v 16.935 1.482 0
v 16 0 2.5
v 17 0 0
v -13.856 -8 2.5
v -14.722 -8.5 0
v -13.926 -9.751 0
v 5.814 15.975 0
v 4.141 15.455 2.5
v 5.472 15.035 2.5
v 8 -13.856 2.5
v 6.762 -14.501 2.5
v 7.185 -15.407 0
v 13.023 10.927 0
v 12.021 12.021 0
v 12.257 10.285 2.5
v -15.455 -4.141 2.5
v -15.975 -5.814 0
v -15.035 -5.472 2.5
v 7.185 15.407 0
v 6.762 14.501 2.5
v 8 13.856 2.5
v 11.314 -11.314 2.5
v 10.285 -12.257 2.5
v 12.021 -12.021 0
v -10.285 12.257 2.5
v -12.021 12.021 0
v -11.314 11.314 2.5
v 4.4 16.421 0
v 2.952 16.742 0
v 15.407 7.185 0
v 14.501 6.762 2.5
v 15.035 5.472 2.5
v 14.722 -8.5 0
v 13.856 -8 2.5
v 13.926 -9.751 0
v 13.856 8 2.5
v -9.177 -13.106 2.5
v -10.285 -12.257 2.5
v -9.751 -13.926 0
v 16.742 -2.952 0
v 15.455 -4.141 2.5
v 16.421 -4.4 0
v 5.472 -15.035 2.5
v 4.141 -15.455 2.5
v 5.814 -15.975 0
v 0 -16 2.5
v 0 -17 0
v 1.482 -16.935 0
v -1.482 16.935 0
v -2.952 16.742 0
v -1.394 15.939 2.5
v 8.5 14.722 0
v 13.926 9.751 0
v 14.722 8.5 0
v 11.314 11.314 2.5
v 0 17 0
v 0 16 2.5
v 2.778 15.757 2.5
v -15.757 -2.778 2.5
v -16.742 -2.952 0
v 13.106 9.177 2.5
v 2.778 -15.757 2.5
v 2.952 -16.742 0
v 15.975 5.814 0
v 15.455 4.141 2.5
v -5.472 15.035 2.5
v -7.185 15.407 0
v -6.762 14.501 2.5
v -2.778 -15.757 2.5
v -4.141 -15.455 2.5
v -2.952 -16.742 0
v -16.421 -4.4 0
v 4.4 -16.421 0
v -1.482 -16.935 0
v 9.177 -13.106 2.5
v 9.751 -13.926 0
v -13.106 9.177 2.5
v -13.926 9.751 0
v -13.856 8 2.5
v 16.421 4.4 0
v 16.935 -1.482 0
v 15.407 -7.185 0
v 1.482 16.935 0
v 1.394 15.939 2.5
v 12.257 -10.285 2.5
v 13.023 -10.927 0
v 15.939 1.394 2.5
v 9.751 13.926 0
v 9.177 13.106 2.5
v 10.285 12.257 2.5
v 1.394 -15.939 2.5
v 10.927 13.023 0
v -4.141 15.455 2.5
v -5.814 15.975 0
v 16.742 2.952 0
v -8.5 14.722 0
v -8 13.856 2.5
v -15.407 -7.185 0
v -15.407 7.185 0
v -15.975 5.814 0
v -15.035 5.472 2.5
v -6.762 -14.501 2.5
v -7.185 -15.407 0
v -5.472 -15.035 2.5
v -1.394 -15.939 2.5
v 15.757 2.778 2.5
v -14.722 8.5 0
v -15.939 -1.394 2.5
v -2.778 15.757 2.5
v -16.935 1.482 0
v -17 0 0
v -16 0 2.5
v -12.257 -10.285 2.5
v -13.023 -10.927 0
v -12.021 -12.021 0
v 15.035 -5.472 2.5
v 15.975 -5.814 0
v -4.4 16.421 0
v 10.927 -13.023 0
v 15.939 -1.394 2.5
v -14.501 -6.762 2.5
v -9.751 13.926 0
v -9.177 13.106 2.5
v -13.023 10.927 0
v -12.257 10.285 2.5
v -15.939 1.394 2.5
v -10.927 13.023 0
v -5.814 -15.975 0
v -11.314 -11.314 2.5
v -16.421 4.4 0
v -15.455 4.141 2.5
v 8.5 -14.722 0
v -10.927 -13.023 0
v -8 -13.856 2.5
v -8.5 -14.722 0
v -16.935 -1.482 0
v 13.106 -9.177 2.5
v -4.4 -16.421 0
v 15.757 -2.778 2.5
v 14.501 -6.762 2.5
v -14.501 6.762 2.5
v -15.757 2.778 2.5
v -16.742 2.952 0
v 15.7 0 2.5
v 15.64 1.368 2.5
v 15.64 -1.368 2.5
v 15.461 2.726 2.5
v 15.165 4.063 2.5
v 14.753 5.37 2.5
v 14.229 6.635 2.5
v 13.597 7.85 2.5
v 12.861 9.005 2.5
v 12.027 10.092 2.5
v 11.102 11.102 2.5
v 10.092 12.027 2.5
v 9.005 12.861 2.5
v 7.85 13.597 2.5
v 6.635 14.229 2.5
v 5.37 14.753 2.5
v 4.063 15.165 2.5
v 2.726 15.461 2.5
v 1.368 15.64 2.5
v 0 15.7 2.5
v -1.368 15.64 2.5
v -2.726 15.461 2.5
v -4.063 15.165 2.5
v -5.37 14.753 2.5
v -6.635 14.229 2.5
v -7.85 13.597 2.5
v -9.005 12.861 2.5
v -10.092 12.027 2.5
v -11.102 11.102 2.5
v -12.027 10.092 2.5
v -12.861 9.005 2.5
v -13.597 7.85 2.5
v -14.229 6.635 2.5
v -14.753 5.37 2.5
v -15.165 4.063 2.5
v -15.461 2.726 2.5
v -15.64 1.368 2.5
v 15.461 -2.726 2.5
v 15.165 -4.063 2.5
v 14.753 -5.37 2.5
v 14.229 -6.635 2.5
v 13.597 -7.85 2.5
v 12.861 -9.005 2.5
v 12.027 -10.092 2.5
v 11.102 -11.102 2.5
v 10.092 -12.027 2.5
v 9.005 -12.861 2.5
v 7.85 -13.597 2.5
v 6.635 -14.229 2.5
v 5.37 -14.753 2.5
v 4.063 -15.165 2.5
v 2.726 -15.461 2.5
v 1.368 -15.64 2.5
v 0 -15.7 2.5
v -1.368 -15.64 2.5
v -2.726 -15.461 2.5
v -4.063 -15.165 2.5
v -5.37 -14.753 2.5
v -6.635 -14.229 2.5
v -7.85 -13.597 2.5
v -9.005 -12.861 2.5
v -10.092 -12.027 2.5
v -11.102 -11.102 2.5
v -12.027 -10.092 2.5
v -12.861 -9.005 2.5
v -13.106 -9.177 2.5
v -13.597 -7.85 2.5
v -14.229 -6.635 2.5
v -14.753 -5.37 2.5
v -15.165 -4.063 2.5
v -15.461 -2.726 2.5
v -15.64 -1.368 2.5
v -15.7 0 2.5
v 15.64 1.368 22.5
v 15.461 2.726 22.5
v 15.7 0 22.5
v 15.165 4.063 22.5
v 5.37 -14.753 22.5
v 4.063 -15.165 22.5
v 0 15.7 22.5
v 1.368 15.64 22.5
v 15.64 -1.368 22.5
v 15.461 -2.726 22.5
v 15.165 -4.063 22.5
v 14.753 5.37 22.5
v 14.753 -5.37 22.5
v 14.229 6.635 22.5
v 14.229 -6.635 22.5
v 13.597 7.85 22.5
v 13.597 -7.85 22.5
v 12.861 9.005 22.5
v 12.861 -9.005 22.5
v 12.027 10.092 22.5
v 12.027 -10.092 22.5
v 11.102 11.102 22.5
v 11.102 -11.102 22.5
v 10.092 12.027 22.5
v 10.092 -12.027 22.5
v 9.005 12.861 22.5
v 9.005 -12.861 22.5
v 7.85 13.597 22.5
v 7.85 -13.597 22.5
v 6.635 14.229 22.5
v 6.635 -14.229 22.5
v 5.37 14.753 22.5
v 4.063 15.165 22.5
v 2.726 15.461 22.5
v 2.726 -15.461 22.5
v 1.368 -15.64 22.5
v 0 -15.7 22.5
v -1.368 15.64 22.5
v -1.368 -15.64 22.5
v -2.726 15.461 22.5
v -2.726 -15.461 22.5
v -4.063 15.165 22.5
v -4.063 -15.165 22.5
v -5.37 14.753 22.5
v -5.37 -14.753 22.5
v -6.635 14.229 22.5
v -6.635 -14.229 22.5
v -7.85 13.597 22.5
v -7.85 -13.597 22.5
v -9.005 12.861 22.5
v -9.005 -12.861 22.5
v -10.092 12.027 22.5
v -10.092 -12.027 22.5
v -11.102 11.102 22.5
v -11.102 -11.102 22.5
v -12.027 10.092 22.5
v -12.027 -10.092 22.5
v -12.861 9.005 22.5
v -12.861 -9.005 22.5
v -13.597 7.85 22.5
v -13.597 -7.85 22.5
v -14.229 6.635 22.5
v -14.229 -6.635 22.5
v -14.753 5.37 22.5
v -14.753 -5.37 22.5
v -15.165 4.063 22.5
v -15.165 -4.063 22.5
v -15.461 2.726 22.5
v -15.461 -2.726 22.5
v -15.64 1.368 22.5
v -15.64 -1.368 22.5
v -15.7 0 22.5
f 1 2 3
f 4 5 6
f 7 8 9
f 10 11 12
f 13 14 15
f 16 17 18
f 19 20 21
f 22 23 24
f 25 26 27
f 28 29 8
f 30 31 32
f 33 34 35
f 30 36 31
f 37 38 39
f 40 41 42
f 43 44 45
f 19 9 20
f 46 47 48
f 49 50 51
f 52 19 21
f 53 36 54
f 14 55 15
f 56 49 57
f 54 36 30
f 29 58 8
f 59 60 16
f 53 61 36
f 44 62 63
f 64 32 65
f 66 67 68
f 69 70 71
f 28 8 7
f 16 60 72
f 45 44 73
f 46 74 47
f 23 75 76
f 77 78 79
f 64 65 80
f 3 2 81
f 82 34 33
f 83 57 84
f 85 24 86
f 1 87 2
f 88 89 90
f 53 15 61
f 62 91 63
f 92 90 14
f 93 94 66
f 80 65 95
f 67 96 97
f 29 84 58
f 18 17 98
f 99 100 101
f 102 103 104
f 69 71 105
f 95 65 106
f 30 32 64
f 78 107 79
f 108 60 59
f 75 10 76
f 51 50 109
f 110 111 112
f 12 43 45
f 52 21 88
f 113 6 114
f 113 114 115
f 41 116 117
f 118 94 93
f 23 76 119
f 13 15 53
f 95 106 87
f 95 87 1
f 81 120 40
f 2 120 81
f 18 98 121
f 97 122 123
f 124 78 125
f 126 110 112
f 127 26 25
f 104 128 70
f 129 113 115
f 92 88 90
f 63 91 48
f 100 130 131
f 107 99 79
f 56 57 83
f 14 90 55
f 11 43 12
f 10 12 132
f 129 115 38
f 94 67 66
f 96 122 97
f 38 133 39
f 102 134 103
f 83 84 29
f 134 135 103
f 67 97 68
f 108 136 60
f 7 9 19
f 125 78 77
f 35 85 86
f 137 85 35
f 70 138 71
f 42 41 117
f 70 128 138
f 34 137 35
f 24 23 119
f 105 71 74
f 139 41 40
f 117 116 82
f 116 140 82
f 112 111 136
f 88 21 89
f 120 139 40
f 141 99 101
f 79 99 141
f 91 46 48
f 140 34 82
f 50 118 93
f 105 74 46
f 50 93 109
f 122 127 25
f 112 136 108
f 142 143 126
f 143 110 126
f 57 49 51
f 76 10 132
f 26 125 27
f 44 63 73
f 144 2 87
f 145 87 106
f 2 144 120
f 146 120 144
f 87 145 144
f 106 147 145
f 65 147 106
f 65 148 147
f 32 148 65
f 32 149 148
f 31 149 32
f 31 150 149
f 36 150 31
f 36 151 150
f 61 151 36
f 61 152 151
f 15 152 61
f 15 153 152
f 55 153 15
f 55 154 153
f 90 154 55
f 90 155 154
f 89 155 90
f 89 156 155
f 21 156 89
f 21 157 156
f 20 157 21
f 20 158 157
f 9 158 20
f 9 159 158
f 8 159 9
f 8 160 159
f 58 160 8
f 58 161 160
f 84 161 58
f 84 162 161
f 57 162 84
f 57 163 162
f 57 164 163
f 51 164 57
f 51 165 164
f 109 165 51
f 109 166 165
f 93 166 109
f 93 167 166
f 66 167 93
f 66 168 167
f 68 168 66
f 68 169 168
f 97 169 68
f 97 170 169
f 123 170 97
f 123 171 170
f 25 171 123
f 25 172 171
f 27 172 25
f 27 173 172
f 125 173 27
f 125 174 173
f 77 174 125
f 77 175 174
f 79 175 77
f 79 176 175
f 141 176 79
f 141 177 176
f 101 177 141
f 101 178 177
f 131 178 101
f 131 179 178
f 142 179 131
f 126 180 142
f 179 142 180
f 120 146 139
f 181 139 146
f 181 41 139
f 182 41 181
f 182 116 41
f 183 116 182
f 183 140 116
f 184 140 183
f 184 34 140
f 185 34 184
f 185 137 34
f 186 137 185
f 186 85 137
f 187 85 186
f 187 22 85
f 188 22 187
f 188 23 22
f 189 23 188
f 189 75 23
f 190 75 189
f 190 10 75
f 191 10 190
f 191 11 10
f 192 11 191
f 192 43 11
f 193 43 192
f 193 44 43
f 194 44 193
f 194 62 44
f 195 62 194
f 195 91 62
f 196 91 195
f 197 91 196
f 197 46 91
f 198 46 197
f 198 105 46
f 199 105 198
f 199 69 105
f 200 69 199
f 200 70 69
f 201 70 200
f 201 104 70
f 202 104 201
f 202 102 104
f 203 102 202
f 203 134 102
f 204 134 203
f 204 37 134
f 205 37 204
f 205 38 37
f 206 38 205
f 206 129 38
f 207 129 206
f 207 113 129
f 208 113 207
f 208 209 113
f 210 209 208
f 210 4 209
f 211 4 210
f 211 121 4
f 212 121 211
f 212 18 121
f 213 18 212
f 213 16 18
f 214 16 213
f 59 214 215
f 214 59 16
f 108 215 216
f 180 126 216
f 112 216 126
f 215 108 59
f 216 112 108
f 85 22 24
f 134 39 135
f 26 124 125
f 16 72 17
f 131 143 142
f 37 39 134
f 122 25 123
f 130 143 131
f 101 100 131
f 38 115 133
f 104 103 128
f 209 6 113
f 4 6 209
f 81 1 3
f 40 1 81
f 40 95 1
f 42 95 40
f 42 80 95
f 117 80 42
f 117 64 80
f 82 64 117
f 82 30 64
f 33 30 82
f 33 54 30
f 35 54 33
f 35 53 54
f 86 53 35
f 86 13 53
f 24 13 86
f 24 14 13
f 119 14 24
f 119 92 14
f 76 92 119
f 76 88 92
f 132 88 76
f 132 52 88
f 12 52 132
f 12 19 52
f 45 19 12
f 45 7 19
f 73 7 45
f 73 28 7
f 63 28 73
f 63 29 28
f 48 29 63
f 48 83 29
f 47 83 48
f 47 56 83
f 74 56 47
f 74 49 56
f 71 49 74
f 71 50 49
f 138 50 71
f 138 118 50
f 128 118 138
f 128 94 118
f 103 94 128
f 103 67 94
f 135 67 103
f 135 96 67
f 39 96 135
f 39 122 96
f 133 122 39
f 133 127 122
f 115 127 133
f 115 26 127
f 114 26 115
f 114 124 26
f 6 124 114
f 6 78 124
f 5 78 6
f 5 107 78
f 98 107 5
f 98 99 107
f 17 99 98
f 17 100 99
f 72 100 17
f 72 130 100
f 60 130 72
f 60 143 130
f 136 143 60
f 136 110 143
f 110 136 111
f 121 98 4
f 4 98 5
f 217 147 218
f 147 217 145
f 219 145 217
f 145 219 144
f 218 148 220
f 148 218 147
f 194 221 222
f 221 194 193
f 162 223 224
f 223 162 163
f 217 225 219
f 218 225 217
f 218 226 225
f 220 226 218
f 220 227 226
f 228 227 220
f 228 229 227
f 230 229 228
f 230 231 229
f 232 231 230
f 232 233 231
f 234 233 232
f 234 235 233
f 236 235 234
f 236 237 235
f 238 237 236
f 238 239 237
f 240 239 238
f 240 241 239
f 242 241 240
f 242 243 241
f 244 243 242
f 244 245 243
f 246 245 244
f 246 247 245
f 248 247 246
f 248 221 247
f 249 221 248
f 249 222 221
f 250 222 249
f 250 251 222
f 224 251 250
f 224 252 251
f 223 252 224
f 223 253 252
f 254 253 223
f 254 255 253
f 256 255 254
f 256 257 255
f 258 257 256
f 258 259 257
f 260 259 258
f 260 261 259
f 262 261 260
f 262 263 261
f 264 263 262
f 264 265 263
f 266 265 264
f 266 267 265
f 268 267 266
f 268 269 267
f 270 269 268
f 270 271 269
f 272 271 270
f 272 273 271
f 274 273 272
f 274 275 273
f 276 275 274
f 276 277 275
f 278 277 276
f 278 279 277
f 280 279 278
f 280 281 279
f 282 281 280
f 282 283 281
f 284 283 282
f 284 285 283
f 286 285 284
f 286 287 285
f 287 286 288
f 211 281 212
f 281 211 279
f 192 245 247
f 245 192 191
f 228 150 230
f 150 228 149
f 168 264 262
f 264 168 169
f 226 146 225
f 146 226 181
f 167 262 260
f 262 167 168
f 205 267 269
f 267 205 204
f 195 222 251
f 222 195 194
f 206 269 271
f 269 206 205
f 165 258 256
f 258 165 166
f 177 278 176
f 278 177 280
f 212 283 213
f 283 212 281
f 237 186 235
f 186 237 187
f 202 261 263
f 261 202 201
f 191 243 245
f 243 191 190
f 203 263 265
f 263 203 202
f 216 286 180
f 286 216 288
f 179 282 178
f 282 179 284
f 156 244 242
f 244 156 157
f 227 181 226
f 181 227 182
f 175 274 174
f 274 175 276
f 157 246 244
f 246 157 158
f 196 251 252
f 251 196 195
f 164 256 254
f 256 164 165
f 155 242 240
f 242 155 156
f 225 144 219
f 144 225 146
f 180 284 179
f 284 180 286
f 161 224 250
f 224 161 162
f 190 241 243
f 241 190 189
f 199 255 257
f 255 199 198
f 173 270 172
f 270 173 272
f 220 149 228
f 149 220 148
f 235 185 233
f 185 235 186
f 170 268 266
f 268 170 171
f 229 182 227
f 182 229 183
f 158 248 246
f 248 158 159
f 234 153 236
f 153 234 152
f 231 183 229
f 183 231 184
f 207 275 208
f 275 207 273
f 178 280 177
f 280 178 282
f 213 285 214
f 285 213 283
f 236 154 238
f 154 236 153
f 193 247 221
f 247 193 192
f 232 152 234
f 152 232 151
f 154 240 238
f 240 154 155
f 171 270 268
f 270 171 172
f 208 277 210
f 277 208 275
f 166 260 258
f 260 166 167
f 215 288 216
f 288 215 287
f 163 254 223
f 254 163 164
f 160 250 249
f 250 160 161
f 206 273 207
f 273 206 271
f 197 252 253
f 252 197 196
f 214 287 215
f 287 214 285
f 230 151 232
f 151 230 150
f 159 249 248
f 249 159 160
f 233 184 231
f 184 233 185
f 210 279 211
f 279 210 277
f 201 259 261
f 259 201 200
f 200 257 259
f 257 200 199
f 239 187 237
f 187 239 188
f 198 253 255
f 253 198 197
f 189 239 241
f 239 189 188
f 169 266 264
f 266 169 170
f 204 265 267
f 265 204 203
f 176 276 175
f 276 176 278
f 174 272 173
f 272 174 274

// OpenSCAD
$fn=72;
cylinder(h=2.5,r1=34/2,r2=32/2);
translate([0,0,2.5])cylinder(h=20,r1=31.4/2,r2=31.4/2);
